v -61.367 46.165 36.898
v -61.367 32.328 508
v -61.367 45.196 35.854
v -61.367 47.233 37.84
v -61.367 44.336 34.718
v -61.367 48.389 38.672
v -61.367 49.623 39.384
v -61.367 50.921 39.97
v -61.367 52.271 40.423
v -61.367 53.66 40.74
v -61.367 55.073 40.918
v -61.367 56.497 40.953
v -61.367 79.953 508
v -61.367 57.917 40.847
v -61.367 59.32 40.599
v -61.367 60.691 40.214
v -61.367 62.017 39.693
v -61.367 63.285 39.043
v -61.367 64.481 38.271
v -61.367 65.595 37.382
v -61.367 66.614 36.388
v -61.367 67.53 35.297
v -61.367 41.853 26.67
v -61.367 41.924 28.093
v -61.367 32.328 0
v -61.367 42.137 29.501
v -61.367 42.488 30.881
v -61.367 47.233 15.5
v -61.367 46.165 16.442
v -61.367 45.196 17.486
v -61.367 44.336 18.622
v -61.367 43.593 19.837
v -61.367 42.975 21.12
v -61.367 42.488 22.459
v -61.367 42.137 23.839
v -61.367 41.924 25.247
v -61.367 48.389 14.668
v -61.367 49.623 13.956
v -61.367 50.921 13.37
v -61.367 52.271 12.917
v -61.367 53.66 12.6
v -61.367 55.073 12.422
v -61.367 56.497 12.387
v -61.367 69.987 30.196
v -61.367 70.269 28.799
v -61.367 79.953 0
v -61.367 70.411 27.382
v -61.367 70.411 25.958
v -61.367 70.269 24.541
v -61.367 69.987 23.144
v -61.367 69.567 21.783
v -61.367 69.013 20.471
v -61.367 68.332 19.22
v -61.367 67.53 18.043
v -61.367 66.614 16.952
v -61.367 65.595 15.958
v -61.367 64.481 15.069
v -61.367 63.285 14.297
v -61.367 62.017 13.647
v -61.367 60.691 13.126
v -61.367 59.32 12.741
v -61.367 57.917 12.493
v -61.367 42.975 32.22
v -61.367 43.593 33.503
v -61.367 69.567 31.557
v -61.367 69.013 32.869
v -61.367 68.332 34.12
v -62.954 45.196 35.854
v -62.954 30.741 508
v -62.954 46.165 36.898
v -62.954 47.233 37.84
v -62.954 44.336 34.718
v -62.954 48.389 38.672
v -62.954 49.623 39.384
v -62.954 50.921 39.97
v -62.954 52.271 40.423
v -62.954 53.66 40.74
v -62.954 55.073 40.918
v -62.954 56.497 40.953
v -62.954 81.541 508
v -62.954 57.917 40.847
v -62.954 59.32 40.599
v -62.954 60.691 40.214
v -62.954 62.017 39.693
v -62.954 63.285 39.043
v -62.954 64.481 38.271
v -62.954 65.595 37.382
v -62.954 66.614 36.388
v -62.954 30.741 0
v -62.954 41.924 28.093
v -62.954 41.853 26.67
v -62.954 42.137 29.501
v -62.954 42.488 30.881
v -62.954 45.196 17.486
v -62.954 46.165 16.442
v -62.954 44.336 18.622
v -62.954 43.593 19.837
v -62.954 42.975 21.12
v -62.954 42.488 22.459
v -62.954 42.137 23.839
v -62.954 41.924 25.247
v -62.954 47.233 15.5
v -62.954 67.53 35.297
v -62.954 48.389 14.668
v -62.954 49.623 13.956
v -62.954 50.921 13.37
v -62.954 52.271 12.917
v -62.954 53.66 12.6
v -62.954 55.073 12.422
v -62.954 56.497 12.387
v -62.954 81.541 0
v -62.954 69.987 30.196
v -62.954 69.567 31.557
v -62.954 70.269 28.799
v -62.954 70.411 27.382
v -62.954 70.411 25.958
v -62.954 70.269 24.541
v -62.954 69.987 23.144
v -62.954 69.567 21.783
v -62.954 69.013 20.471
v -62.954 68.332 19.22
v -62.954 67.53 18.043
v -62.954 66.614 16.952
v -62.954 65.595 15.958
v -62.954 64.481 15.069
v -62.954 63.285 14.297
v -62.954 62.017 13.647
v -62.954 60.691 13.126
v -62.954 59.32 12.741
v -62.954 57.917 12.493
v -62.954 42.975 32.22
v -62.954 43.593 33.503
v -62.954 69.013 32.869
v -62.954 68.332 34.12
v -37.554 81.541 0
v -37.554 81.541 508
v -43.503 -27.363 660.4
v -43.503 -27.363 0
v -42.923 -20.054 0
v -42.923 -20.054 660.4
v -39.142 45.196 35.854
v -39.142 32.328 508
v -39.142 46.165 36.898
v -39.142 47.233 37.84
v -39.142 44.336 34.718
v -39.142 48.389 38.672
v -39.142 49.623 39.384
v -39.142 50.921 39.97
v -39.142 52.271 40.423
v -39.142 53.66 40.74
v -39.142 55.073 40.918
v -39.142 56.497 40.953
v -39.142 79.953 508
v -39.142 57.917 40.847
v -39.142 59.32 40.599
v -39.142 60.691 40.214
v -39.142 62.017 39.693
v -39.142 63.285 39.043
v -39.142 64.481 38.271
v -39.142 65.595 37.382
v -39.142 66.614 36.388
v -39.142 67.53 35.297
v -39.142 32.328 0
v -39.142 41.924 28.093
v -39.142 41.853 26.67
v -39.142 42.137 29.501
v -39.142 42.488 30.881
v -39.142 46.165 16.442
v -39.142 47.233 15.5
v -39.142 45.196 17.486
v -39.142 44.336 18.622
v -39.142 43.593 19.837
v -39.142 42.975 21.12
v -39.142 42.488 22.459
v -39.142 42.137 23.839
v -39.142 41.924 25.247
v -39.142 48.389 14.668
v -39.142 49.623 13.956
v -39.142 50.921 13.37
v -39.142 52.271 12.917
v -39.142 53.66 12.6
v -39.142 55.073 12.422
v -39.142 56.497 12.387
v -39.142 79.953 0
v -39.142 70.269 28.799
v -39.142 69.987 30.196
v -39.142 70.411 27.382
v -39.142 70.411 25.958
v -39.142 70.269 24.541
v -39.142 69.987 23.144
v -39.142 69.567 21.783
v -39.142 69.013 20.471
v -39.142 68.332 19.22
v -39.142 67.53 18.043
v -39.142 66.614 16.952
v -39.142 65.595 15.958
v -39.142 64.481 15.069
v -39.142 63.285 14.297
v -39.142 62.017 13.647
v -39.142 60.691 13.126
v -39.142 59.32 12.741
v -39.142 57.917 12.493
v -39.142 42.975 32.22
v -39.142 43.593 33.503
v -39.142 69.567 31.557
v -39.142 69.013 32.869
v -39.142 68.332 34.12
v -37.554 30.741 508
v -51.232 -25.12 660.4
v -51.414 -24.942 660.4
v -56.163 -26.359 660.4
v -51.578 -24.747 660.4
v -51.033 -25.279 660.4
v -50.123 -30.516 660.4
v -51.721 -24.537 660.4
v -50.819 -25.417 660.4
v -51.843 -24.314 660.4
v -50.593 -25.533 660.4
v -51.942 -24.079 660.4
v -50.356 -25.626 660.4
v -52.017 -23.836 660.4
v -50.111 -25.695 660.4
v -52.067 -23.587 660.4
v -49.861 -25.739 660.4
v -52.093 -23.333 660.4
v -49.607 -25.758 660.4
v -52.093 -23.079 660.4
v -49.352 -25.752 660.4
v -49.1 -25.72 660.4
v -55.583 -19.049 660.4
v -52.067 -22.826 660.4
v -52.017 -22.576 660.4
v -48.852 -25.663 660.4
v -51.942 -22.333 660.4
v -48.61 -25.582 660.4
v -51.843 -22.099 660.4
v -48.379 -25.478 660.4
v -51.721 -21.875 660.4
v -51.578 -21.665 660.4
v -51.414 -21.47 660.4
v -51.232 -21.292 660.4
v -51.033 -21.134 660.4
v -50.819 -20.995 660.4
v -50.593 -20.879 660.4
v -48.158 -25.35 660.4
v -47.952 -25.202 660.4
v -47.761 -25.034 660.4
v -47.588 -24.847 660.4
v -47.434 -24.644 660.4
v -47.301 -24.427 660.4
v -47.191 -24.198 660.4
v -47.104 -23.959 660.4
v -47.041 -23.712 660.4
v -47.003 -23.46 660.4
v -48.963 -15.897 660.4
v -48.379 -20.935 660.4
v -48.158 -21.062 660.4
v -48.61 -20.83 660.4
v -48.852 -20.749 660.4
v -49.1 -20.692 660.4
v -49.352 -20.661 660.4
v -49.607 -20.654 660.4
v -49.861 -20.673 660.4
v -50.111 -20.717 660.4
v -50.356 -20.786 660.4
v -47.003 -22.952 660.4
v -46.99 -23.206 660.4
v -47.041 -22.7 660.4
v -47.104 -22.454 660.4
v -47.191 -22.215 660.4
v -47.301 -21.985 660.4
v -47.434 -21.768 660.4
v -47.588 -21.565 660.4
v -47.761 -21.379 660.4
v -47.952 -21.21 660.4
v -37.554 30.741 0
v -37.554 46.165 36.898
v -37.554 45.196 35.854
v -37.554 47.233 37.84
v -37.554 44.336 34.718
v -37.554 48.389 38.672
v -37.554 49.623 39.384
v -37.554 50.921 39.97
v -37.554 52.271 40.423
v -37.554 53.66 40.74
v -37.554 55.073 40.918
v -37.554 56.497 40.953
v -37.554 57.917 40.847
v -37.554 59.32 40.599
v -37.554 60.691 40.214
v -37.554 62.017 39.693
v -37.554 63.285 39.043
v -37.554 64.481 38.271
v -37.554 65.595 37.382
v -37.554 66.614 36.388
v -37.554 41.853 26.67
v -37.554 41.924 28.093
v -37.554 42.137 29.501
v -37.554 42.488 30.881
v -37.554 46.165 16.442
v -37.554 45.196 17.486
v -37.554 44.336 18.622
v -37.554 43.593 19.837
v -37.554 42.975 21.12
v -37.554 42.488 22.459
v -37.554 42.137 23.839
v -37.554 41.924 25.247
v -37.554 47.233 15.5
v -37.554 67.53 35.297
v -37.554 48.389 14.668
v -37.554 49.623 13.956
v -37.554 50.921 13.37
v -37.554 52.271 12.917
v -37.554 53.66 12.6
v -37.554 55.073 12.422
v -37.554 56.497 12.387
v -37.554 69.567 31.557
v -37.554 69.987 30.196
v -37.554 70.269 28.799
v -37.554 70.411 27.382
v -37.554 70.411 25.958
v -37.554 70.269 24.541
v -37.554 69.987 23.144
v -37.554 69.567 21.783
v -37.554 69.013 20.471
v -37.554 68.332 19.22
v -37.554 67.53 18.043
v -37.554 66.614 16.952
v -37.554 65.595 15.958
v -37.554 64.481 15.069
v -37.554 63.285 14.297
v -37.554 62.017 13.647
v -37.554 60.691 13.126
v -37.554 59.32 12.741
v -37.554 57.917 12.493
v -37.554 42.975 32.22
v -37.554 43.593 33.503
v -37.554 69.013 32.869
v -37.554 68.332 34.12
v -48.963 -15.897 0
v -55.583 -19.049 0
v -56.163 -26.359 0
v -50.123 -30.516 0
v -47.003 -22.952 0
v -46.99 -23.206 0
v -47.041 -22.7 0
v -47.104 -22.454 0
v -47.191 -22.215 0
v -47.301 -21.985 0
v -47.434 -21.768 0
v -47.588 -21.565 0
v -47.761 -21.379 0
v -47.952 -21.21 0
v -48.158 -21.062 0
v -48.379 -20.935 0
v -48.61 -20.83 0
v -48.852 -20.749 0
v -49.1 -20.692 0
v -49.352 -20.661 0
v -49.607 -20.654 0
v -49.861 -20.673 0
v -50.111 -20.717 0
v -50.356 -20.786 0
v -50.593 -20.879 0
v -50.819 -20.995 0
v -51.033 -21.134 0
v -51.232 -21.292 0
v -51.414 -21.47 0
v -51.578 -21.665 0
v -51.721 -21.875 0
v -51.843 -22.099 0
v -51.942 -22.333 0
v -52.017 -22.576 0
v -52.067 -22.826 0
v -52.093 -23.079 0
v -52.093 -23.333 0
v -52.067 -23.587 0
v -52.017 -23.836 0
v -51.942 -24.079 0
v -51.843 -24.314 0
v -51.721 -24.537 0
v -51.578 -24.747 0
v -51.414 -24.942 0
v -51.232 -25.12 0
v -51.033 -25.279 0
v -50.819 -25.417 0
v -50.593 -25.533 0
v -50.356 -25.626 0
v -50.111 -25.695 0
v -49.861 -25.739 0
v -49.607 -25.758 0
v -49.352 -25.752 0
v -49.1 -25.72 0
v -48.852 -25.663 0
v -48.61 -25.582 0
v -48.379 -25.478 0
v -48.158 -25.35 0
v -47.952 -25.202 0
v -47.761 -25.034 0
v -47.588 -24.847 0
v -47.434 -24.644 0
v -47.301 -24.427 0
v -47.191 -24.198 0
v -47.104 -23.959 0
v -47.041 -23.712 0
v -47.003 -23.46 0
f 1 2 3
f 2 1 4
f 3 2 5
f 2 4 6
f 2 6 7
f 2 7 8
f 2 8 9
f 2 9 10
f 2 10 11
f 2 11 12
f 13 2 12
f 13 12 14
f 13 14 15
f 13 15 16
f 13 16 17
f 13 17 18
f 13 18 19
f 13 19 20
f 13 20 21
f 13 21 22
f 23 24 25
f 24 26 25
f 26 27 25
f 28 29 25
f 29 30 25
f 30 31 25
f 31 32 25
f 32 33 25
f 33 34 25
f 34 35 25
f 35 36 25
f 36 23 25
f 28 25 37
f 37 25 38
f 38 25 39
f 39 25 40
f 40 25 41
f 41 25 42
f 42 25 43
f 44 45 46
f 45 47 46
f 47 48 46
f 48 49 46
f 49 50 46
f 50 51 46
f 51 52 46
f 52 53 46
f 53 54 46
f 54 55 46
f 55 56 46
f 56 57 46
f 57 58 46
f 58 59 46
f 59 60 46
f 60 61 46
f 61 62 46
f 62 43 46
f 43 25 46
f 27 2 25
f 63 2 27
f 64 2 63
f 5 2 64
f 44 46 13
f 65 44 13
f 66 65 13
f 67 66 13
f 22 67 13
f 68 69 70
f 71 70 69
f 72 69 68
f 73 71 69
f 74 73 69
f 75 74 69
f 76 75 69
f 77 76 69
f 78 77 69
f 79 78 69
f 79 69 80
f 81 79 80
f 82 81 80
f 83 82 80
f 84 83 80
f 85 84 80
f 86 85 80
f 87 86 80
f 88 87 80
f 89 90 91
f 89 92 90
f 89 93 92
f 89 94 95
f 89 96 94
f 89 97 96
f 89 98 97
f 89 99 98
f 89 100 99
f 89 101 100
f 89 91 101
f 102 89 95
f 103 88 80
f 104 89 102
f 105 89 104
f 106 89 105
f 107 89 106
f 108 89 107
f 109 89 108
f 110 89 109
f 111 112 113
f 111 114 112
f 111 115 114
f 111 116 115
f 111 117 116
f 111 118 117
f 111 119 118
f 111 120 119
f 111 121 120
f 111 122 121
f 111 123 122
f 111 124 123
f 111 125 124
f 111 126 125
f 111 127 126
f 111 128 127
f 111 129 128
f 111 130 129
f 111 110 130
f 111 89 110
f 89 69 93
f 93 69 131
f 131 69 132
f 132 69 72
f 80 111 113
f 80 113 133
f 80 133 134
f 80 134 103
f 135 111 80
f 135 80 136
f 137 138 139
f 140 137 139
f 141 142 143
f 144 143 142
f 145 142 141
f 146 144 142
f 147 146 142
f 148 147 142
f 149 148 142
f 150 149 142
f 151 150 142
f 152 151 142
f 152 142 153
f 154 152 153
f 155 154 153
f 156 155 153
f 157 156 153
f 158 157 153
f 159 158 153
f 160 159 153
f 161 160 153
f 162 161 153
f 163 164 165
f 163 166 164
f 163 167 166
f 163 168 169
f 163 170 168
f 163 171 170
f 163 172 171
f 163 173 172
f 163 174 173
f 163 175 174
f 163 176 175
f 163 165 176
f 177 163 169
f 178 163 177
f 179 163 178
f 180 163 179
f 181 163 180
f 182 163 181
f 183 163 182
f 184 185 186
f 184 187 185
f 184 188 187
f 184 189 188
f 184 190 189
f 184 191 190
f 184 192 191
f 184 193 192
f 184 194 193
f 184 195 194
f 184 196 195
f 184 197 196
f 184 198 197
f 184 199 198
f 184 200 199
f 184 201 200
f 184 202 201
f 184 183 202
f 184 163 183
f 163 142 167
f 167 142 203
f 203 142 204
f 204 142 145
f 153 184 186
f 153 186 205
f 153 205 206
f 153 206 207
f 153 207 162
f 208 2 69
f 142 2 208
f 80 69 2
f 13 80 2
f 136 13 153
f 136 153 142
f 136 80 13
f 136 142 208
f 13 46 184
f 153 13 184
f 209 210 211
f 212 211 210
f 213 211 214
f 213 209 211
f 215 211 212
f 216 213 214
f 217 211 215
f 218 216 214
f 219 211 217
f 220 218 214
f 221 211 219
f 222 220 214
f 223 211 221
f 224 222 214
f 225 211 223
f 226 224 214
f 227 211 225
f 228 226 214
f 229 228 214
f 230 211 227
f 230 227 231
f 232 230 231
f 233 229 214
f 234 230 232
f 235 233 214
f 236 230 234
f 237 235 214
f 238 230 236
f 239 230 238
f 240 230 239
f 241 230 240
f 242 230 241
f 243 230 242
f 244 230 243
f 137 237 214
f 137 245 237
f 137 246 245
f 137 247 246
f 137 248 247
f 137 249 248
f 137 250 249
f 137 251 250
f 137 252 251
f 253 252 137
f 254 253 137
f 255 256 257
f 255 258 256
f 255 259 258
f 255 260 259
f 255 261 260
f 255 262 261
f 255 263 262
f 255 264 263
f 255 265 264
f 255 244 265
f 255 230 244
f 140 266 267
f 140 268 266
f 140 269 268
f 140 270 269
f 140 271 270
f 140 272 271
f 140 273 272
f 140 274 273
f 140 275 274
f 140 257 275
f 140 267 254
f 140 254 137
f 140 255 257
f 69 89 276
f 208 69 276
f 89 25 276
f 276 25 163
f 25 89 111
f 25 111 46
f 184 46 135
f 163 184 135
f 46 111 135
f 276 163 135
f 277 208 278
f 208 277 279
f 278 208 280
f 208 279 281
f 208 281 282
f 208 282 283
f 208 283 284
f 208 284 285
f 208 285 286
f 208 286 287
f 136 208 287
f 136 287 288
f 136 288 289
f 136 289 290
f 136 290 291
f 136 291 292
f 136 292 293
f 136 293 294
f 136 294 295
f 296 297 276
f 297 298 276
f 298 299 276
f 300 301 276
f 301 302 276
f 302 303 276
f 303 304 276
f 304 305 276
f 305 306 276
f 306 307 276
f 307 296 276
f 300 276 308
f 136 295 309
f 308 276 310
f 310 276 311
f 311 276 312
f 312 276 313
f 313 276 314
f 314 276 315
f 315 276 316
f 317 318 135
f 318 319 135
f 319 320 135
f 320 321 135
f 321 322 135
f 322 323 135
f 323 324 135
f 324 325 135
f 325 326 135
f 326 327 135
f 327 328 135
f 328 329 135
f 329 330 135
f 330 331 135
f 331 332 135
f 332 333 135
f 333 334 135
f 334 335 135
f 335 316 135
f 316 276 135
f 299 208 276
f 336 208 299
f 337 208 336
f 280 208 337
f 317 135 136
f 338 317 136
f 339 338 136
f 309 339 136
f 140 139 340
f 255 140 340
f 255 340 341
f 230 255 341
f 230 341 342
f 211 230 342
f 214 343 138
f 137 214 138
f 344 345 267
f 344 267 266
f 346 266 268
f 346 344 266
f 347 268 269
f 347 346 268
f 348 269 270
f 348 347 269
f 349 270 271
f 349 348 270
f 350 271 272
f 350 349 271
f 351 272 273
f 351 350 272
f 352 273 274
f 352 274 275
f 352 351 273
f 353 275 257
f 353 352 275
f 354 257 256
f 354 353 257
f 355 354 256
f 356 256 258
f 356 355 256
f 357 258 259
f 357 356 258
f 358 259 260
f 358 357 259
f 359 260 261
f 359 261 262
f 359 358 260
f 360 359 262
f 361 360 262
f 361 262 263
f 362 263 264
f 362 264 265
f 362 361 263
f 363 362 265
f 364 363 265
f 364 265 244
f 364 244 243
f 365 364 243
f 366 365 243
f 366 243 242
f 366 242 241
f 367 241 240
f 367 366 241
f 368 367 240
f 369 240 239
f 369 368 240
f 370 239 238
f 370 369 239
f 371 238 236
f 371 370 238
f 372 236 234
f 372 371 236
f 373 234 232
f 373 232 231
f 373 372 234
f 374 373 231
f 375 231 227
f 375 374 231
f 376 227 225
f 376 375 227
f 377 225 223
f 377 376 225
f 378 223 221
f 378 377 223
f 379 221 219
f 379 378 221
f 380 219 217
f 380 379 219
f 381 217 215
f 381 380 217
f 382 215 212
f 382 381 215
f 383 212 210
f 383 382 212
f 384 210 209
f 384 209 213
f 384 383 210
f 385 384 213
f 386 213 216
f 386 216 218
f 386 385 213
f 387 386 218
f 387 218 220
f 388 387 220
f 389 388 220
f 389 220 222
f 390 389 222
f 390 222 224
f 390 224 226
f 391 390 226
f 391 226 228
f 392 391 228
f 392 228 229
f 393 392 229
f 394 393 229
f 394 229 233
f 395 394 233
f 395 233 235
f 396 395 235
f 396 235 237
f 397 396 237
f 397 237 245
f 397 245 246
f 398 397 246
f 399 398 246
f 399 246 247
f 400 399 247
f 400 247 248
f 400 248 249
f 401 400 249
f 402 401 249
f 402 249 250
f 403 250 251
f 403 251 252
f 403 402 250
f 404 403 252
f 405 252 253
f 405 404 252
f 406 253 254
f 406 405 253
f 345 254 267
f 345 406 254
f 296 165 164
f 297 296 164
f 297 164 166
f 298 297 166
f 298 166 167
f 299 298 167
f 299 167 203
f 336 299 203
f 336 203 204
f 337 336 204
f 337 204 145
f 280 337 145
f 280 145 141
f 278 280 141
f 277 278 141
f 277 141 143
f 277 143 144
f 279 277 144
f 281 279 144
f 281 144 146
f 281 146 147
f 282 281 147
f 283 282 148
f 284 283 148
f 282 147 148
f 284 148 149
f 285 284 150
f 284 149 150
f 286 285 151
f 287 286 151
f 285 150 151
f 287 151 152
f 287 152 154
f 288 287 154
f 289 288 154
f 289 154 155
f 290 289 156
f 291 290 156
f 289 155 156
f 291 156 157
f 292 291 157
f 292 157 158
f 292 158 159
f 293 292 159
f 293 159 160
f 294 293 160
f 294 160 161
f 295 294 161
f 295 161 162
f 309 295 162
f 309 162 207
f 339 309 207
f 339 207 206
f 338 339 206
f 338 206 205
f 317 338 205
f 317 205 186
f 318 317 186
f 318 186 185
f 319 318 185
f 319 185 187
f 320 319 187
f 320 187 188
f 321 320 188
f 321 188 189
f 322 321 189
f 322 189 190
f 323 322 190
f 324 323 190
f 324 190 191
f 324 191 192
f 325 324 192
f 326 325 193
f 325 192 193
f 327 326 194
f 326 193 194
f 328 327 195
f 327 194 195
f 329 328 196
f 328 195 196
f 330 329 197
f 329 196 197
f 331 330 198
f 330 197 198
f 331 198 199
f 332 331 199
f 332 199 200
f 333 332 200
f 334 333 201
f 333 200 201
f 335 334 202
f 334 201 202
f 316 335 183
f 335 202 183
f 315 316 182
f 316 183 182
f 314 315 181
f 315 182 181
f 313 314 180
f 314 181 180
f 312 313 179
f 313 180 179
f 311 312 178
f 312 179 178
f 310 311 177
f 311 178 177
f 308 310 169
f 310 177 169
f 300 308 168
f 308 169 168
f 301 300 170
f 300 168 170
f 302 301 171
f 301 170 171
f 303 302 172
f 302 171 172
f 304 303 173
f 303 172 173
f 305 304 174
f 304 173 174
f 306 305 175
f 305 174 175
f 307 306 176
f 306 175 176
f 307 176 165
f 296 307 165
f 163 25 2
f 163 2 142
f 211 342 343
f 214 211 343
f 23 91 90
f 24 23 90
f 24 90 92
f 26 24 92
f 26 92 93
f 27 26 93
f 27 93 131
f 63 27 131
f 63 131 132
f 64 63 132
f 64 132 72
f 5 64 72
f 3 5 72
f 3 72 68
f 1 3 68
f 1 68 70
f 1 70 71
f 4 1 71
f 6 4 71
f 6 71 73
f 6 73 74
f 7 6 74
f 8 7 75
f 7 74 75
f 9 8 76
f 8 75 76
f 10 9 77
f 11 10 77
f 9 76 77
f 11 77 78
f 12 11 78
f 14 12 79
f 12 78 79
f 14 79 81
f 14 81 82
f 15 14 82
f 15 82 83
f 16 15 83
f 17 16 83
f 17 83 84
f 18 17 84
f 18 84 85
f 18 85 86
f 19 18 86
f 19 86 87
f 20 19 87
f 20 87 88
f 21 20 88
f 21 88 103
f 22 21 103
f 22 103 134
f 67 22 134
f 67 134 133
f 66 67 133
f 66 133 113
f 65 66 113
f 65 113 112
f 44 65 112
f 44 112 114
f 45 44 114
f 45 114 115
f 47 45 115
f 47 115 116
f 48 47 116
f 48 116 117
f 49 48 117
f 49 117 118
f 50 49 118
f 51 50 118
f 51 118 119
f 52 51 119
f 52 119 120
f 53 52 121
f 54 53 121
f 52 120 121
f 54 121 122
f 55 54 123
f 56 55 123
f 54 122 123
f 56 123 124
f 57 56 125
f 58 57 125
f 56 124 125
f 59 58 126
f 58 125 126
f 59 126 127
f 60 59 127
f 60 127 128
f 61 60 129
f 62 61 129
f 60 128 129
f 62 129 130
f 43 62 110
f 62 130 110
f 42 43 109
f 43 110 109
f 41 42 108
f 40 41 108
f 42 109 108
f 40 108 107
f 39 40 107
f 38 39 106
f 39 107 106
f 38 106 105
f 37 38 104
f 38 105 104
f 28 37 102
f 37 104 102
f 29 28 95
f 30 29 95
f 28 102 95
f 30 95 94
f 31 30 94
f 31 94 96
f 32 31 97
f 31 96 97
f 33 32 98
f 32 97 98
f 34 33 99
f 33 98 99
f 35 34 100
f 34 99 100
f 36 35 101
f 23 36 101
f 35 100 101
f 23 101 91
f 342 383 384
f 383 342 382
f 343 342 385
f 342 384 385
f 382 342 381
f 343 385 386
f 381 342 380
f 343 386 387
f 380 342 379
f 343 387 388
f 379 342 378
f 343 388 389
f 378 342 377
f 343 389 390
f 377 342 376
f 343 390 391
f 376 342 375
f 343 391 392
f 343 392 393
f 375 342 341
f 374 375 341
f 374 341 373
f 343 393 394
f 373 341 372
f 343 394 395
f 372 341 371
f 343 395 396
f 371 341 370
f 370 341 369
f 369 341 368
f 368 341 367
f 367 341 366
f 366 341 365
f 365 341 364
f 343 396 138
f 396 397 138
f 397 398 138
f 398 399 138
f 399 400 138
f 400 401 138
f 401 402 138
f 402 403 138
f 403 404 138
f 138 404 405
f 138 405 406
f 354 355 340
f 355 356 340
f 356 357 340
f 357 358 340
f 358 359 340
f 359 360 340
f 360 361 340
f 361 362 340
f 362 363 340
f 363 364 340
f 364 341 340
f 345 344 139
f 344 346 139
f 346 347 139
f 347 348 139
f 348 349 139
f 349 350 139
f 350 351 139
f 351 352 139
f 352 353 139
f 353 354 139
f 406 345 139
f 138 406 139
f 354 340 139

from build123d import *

# Parameters (mm, degrees)
F0_W     = 25.4
F0_H     = 50.8
F0_W_2   = 22.225
F0_H_2   = 47.625
F1_DEPTH = 508
F2_R     = 14.2875
F3_DEPTH = 25.4
F4_R     = 2.5527
F5_DEPTH = 660.4


with BuildPart() as f1:
    # F0 (on Top) → F1 (new body)
    with BuildSketch(Plane.XY):
        with Locations((-50.254215, 56.140824)):
            Rectangle(F0_W, F0_H)
        with Locations((-50.254215, 56.140824)):
            Rectangle(F0_W_2, F0_H_2, mode=Mode.SUBTRACT)
    extrude(amount=F1_DEPTH)

    # F2 (on face) → F3 (cut, through all)
    with BuildSketch(Plane(origin=(-62.954215, 0, 0), x_dir=(0, -1, 0), z_dir=(-1, 0, 0))):
        with Locations((-56.140824, 26.67)):
            Circle(F2_R)
    extrude(amount=-F3_DEPTH, mode=Mode.SUBTRACT)


with BuildPart() as f5:
    # F4 (on Top) → F5 (new body)
    with BuildSketch(Plane.XY):
        Polygon((-50.123066, -30.51553), (-43.502979, -27.363105), (-42.923016, -20.053729), (-48.963139, -15.896778), (-55.583226, -19.049203), (-56.16319, -26.358579), align=None)
        with Locations((-49.543103, -23.206154)):
            Circle(F4_R, mode=Mode.SUBTRACT)
    extrude(amount=F5_DEPTH)


solid = Compound([f1.part, f5.part])
